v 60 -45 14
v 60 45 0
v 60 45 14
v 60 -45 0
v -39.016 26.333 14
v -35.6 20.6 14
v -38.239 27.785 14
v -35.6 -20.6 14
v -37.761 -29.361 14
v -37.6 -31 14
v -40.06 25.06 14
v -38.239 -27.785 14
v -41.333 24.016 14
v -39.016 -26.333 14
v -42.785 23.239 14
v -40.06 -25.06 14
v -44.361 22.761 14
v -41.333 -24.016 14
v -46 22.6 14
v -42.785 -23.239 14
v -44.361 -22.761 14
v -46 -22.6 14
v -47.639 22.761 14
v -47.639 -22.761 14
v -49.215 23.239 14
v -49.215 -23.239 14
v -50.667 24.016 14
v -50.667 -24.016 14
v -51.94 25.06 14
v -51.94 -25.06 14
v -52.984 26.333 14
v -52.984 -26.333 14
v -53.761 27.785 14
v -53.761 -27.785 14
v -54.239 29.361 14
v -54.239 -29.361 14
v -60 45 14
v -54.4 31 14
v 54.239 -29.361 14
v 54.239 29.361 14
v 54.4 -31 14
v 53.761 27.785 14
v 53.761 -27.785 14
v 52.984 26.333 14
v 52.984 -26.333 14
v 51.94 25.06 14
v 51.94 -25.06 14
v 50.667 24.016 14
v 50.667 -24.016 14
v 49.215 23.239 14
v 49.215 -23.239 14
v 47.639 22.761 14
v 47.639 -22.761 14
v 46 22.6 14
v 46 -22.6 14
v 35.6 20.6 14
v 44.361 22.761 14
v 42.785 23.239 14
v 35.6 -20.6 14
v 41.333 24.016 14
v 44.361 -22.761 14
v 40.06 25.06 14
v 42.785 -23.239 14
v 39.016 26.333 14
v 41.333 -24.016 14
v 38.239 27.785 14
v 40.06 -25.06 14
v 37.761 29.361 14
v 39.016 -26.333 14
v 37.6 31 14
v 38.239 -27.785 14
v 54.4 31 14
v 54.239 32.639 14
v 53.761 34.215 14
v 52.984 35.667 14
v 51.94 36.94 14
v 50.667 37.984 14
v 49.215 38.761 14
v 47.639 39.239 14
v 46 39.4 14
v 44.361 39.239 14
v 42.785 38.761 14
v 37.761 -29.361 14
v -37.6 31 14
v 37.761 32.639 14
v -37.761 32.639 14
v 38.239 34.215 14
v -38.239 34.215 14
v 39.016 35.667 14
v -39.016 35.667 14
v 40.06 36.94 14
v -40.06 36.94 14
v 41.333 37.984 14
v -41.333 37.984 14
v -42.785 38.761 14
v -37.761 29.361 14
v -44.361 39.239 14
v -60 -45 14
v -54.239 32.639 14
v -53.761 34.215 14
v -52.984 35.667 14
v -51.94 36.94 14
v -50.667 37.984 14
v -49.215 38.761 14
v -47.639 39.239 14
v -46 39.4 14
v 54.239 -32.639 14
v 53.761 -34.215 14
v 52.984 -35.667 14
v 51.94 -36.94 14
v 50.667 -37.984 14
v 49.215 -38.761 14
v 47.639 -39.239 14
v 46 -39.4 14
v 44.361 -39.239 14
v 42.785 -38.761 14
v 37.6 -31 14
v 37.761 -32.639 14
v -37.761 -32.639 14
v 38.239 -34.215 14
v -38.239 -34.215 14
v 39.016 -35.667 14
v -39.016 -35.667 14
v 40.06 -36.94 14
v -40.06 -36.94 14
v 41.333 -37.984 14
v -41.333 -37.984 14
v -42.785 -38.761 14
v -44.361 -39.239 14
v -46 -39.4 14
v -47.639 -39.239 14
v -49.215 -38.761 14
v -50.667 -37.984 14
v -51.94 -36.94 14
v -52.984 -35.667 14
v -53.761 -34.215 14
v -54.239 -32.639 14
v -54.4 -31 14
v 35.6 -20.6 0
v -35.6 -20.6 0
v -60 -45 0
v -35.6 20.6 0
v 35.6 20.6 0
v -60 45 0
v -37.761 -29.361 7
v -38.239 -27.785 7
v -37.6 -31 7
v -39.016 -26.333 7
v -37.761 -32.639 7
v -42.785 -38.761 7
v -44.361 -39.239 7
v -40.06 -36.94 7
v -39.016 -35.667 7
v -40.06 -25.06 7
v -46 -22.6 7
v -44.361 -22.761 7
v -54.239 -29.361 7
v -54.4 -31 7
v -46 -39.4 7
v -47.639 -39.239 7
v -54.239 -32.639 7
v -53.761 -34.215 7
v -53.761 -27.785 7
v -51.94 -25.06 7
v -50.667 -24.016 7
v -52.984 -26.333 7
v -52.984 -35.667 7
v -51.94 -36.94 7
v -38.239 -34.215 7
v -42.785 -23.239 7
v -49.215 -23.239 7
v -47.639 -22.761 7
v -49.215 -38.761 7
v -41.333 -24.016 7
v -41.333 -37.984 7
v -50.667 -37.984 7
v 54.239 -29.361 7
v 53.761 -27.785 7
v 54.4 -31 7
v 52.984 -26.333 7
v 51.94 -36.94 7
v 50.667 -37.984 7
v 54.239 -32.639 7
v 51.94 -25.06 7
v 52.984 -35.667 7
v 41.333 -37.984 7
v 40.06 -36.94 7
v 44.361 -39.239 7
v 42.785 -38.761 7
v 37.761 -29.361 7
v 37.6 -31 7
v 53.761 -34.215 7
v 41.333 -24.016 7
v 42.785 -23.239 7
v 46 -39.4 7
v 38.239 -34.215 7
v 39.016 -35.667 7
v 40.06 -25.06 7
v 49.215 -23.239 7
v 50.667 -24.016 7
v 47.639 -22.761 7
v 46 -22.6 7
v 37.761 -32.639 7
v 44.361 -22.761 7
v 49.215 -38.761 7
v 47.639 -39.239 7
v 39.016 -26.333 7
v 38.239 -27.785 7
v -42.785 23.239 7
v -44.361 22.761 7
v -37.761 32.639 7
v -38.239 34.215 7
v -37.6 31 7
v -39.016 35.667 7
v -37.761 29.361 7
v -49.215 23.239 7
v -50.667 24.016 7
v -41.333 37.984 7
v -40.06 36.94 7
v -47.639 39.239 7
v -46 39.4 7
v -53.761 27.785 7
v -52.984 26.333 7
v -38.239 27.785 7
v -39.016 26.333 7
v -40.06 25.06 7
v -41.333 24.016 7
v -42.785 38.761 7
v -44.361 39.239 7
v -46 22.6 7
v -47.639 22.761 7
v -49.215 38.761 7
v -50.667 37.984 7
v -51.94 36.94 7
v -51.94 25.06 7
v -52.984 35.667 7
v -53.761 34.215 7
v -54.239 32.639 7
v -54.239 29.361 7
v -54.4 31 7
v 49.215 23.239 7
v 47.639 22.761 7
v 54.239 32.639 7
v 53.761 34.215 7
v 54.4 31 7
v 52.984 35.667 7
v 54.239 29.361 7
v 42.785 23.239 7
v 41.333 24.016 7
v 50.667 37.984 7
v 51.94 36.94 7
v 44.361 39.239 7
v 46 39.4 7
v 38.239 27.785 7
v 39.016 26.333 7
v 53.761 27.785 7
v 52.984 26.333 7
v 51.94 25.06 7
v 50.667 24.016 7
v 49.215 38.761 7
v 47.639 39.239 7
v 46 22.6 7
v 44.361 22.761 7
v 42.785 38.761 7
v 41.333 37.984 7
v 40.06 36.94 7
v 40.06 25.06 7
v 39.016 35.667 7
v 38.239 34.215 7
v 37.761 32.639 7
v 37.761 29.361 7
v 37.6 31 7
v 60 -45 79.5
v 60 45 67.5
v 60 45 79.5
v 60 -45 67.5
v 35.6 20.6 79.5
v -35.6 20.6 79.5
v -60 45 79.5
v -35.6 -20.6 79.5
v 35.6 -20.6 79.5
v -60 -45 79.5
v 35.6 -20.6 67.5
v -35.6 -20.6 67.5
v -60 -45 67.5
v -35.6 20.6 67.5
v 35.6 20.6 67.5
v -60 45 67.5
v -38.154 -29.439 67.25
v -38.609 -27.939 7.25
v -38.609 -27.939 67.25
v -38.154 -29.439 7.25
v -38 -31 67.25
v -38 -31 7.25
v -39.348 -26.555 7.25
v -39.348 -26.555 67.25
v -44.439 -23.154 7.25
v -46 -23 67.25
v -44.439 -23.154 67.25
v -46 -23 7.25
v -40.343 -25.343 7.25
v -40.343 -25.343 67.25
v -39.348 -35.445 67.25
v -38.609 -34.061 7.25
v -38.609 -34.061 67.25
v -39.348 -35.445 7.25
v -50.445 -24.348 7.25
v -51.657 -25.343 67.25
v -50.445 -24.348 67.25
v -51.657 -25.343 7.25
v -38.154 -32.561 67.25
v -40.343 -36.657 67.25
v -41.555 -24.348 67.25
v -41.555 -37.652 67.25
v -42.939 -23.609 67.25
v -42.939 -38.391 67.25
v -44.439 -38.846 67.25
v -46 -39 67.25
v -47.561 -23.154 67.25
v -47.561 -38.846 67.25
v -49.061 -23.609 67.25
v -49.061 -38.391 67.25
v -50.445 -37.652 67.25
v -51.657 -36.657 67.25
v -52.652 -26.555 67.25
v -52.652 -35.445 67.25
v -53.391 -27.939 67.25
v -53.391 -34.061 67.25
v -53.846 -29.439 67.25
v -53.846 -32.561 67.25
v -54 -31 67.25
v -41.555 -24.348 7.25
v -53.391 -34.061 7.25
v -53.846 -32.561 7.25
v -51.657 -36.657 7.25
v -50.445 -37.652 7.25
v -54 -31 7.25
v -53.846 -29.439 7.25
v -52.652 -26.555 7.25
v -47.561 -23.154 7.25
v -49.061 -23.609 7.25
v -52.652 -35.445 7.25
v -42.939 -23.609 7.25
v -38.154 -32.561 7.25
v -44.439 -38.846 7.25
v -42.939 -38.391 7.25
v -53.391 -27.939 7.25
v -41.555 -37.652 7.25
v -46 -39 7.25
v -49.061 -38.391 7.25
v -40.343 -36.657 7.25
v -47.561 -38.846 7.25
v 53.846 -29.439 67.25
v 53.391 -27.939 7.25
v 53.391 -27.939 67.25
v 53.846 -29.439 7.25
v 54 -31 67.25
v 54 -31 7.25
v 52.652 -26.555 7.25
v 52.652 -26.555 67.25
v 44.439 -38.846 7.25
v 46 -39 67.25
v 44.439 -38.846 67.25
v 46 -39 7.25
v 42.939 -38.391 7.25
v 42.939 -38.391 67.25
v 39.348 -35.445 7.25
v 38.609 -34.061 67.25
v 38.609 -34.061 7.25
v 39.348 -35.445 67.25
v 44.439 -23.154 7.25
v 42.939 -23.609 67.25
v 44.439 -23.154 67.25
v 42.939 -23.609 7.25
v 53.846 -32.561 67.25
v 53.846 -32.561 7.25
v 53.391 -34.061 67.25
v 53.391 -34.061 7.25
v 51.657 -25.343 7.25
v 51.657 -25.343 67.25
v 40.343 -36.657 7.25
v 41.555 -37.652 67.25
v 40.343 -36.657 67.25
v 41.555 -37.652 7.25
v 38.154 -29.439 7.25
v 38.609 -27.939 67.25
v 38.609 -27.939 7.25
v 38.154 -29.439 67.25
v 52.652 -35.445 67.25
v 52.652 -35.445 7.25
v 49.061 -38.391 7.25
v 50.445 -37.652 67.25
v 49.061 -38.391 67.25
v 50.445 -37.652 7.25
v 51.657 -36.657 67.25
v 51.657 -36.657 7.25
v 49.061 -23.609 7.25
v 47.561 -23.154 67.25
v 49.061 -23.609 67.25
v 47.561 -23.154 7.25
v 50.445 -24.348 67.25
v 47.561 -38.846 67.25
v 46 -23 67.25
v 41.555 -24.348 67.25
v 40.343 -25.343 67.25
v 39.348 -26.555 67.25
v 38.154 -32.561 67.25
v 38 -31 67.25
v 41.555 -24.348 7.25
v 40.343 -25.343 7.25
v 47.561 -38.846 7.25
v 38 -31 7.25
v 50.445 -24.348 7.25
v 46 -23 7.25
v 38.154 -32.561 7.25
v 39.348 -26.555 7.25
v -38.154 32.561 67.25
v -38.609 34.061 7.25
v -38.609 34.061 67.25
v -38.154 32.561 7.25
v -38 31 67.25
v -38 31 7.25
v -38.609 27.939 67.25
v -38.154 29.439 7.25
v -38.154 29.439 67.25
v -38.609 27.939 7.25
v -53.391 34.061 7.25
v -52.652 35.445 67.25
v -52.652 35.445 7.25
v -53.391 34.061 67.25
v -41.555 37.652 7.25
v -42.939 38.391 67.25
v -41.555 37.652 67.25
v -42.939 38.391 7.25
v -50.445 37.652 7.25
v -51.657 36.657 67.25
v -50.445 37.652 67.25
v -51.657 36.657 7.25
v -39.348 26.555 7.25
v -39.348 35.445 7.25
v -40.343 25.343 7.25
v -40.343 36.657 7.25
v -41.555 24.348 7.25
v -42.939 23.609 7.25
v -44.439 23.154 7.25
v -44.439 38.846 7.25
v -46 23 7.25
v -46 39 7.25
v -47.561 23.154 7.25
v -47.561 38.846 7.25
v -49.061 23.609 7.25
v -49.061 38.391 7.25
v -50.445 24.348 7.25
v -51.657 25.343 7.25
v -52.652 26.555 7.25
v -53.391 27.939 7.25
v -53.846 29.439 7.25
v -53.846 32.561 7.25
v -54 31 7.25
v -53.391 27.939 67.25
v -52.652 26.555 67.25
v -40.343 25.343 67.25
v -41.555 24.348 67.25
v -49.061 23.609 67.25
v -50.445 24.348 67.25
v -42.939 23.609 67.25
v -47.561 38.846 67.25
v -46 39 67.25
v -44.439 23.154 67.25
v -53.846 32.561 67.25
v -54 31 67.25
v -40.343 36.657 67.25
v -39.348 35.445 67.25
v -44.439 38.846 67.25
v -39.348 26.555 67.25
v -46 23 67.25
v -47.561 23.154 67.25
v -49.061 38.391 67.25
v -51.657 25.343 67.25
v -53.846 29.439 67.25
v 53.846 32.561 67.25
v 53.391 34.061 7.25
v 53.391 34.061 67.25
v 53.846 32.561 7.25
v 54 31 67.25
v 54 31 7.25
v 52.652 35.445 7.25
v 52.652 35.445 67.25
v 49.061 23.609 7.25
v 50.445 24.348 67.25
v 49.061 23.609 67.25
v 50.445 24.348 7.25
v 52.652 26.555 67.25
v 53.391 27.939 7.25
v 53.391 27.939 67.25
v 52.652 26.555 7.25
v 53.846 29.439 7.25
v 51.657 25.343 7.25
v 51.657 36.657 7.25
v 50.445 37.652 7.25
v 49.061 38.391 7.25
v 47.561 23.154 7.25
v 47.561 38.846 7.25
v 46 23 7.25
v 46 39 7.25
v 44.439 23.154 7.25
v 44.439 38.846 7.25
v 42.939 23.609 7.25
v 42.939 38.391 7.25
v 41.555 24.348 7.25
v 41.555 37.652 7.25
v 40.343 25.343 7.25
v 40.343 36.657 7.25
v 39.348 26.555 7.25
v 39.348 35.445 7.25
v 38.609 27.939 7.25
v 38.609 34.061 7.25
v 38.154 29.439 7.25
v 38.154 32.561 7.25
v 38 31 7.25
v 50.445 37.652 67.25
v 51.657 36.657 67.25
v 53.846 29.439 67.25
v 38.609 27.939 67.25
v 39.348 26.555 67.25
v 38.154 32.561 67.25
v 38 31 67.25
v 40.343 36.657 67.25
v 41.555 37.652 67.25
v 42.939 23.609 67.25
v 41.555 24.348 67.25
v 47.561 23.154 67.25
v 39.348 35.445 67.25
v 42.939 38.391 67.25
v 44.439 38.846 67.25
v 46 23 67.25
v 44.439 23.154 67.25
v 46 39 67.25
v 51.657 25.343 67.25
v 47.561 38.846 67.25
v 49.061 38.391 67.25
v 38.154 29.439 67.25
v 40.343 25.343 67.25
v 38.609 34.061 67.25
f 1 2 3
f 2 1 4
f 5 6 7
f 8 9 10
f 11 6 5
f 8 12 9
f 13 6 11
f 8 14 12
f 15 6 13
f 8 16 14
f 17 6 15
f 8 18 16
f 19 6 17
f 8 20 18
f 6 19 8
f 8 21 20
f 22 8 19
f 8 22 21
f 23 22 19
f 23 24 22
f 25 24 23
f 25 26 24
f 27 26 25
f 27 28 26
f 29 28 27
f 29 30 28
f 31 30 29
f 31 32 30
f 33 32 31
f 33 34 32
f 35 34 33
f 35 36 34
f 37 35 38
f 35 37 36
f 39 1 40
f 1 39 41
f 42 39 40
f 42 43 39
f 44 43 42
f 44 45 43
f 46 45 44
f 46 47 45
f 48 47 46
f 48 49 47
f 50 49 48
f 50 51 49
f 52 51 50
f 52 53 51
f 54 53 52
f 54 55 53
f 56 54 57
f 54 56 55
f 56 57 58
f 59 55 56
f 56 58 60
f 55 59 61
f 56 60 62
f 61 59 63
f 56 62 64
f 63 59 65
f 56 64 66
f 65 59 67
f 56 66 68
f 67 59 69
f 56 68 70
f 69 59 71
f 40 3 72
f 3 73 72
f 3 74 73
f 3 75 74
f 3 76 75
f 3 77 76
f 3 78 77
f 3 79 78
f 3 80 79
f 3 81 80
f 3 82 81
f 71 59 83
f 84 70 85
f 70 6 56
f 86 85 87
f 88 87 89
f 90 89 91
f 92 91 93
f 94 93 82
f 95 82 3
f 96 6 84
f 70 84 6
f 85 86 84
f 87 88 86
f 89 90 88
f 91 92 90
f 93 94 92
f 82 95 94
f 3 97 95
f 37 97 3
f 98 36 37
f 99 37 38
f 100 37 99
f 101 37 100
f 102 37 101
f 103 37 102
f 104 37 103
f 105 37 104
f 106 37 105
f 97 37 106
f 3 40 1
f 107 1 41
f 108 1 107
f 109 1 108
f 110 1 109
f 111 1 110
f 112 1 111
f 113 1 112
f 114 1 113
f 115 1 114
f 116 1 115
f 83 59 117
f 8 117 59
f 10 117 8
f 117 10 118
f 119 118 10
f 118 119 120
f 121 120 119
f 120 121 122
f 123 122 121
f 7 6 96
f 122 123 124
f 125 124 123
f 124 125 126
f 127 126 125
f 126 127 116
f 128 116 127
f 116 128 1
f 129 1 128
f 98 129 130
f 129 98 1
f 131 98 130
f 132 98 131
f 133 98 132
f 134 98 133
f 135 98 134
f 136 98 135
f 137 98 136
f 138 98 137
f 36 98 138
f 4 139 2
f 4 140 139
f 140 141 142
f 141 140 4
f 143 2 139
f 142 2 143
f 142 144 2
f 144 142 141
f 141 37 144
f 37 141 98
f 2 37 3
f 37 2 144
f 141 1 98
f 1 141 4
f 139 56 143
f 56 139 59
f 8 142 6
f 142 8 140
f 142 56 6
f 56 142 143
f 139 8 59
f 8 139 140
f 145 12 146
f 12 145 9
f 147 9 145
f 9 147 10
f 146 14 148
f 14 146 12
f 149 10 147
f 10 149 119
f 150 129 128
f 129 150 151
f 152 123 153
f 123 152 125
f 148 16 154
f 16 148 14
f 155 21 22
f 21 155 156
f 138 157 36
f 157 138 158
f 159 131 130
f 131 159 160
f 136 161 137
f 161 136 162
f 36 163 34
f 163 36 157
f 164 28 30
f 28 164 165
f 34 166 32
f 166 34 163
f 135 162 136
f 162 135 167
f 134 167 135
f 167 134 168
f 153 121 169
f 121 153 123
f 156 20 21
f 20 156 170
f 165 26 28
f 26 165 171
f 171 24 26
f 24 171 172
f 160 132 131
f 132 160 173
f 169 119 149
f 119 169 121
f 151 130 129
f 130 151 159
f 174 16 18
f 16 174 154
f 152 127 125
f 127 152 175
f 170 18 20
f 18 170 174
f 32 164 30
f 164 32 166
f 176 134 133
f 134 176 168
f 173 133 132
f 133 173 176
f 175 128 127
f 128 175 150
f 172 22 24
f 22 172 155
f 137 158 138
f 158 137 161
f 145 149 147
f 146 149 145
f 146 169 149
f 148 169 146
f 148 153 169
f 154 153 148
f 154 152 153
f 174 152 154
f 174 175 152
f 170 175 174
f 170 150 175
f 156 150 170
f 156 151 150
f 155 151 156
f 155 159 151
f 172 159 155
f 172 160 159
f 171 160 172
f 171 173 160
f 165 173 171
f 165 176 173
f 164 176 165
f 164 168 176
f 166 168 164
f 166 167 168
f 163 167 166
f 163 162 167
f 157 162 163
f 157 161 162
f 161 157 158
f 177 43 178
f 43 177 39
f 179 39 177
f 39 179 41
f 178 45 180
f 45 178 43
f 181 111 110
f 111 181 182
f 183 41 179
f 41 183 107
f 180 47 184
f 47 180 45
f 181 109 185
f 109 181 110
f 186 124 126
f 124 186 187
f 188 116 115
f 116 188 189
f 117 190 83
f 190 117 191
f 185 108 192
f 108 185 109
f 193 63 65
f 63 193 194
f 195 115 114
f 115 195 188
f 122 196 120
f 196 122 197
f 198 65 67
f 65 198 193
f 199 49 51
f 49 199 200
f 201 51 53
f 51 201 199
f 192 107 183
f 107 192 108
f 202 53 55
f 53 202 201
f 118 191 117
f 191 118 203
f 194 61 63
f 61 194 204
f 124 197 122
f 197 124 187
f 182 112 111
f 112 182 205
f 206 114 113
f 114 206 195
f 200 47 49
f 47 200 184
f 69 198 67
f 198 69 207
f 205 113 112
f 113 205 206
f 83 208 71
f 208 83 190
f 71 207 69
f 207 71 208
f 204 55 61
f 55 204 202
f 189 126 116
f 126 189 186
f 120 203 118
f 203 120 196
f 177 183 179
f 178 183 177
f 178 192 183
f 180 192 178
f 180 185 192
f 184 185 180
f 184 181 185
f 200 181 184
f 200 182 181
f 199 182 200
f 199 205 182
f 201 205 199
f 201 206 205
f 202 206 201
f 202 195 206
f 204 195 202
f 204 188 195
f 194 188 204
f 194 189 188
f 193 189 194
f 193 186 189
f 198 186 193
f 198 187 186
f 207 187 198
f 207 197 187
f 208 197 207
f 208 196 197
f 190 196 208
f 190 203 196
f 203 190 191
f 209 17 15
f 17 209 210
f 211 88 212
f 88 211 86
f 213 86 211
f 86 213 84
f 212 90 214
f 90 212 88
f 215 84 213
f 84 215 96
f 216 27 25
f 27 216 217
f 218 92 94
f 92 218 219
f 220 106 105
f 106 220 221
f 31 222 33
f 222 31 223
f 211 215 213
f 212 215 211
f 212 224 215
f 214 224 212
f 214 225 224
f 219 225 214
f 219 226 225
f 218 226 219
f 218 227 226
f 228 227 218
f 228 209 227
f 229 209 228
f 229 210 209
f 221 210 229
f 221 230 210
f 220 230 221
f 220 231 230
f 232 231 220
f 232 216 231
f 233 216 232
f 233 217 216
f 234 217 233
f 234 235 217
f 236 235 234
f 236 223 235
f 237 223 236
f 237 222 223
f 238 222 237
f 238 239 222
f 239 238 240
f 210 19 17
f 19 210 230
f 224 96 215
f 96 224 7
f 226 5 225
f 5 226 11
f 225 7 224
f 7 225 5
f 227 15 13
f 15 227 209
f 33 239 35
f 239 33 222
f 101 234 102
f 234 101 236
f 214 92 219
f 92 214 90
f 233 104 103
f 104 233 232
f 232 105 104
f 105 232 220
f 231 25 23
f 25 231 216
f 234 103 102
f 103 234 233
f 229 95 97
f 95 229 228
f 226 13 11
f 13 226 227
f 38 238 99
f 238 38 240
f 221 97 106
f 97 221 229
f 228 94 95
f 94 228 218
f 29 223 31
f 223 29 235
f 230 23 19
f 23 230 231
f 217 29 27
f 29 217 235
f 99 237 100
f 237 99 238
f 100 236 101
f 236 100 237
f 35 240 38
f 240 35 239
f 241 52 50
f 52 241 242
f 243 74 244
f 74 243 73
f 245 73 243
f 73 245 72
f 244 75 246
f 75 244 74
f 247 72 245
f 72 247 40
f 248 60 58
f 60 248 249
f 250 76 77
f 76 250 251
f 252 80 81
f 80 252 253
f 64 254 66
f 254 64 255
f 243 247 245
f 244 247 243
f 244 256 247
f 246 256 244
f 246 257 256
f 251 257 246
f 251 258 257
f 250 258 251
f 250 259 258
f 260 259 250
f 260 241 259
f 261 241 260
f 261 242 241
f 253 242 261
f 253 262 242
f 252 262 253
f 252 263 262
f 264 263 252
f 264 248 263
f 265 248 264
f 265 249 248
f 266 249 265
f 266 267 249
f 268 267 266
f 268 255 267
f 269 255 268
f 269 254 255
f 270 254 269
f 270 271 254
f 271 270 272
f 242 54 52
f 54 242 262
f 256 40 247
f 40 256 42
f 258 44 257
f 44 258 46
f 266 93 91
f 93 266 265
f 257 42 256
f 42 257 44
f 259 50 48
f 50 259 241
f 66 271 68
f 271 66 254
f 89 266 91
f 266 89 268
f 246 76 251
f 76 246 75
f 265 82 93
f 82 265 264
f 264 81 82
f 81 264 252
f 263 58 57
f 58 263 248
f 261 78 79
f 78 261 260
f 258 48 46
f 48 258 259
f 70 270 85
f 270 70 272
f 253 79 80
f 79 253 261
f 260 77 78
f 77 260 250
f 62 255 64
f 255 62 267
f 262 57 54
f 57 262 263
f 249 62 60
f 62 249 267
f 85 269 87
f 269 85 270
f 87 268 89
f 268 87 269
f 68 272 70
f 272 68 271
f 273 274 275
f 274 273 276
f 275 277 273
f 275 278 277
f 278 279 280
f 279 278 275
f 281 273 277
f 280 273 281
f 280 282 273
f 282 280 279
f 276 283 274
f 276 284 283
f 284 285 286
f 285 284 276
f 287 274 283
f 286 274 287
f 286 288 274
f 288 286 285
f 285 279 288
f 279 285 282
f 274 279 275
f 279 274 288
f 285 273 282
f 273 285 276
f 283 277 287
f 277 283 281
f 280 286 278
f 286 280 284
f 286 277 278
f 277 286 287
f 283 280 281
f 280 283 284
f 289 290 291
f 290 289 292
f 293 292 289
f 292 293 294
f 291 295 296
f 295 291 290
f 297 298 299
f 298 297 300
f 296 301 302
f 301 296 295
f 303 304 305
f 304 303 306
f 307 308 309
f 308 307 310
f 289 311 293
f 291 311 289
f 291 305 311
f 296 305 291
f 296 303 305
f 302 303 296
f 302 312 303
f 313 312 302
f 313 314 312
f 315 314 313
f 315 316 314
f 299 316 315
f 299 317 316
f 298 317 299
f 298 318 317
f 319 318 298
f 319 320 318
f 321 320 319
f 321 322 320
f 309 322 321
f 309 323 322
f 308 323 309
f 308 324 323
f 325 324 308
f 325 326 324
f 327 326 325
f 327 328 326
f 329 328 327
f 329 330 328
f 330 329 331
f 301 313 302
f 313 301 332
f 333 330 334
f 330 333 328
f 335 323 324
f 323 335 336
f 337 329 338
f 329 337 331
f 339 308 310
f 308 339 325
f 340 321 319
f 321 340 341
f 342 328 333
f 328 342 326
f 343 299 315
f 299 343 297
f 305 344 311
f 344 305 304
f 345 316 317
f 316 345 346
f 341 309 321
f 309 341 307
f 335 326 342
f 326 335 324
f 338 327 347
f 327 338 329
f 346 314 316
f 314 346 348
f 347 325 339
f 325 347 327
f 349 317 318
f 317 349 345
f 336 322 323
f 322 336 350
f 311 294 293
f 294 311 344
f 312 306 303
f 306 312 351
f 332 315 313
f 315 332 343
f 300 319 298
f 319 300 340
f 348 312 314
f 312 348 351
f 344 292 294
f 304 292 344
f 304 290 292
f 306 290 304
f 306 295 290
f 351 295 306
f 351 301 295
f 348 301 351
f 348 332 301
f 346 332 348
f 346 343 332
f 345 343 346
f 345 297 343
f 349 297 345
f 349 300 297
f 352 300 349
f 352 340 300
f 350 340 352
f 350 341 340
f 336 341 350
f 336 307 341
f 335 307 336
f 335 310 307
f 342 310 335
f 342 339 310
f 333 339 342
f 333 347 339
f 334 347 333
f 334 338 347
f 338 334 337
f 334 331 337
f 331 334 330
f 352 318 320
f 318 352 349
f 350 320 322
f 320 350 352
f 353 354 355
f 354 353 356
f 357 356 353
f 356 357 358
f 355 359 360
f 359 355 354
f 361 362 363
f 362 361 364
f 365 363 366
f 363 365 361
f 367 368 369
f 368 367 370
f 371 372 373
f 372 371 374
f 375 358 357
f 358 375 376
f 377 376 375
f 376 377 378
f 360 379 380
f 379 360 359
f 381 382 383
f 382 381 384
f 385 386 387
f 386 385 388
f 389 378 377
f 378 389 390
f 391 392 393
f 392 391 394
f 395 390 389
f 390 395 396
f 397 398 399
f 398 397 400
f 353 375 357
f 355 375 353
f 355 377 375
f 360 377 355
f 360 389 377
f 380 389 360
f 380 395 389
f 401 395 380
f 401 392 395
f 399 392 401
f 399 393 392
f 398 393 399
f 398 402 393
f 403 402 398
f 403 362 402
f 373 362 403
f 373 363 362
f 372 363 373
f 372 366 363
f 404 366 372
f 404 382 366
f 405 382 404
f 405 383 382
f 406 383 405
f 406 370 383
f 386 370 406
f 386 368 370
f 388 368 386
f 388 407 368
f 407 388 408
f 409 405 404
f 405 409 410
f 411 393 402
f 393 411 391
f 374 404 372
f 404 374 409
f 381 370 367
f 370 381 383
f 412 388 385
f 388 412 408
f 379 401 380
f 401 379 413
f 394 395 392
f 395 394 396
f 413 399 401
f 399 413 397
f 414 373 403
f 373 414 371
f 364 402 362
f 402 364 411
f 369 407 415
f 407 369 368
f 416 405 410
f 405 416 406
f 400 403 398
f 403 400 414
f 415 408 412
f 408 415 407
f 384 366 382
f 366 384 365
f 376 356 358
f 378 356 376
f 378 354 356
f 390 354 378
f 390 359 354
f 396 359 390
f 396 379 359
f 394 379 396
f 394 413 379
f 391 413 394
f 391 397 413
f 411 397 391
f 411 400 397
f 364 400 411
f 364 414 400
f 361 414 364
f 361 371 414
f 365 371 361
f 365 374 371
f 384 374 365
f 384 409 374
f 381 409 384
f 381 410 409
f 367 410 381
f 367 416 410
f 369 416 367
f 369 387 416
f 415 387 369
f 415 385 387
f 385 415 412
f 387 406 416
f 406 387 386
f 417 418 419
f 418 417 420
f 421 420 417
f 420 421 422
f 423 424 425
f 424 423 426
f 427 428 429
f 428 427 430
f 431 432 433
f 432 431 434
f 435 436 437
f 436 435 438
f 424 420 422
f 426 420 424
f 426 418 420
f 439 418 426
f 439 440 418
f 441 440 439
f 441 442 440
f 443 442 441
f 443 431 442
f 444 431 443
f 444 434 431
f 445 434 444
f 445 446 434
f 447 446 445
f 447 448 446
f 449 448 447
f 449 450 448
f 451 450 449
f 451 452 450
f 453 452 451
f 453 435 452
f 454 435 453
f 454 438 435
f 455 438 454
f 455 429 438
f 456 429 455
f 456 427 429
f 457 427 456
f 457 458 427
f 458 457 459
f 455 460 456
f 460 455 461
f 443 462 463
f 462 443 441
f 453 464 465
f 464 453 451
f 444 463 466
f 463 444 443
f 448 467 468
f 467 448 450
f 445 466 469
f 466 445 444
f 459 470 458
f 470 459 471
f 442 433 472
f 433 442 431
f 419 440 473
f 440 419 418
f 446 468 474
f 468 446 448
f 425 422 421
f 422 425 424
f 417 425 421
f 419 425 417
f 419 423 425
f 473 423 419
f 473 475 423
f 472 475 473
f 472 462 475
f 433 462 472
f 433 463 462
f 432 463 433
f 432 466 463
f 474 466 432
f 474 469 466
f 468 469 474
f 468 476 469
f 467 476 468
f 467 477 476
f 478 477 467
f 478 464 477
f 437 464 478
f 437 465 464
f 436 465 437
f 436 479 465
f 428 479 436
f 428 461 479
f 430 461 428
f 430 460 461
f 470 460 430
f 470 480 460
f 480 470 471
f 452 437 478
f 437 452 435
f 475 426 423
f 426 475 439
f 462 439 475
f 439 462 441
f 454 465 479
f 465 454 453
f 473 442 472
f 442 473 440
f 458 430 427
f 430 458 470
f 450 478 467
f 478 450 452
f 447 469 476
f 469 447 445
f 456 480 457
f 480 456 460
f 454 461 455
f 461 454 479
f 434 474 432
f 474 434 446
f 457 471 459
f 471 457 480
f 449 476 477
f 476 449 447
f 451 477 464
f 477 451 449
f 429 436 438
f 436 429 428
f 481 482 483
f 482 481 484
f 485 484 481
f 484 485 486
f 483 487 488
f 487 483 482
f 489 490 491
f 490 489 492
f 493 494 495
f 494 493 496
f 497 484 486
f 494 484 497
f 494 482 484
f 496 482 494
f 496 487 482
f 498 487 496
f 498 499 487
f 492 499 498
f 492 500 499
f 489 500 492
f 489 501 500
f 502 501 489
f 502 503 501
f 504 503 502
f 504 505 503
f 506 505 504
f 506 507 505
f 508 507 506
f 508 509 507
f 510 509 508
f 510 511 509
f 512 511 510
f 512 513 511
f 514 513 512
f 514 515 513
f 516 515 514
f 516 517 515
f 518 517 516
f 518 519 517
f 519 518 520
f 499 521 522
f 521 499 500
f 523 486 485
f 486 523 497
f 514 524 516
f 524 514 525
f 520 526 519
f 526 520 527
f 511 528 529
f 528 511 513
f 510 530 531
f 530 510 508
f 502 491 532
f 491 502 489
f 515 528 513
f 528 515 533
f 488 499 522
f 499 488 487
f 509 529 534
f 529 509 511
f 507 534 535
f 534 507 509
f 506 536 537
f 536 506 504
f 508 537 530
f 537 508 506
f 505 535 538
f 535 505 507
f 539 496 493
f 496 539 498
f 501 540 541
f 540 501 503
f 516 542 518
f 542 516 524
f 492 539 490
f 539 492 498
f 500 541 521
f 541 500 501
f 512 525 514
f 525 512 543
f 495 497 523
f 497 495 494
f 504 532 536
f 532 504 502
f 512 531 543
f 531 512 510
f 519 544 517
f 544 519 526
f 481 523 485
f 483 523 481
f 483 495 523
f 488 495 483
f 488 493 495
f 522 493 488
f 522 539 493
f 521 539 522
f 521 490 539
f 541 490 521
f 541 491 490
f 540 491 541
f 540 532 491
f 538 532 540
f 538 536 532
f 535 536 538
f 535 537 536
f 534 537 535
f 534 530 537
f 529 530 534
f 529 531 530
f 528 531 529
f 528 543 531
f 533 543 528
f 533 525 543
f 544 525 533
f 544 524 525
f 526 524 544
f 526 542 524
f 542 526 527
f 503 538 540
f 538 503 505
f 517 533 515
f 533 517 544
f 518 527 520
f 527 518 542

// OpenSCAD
$fn = 32;

// ------------------------------------------------------------------------
// Frame cube: base 120 x 90 mm, posts 60 mm tall
// Every part is its own module, assembly() places every instance.
// ------------------------------------------------------------------------

// --- part 1 ---
module base_frame() {
  difference() {
    translate([-60, -45, 0]) cube([120, 90, 14]);
    translate([-35.6, -20.6, -1]) cube([71.2, 41.2, 16]);
    translate([-46, -31, 7]) cylinder(h = 8, d = 16.8);
    translate([46, -31, 7]) cylinder(h = 8, d = 16.8);
    translate([-46, 31, 7]) cylinder(h = 8, d = 16.8);
    translate([46, 31, 7]) cylinder(h = 8, d = 16.8);
  }
}

// --- part 2 ---
module corner_post() {
  cylinder(h = 60, d = 16);
}

// --- part 3 ---
module top_frame() {
  difference() {
    translate([-60, -45, 0]) cube([120, 90, 12]);
    translate([-35.6, -20.6, -1]) cube([71.2, 41.2, 14]);
  }
}

// --- assembly ---
module assembly() {
  color([0.80, 0.24, 0.20]) translate([0, 0, 0]) rotate([0, 0, 0]) base_frame();
  color([0.20, 0.45, 0.75]) translate([-46, -31, 7.25]) rotate([0, 0, 0]) corner_post();
  color([0.25, 0.62, 0.32]) translate([46, -31, 7.25]) rotate([0, 0, 0]) corner_post();
  color([0.92, 0.70, 0.18]) translate([-46, 31, 7.25]) rotate([0, 0, 0]) corner_post();
  color([0.58, 0.35, 0.70]) translate([46, 31, 7.25]) rotate([0, 0, 0]) corner_post();
  color([0.16, 0.66, 0.66]) translate([0, 0, 67.5]) rotate([0, 0, 0]) top_frame();
}

assembly();
